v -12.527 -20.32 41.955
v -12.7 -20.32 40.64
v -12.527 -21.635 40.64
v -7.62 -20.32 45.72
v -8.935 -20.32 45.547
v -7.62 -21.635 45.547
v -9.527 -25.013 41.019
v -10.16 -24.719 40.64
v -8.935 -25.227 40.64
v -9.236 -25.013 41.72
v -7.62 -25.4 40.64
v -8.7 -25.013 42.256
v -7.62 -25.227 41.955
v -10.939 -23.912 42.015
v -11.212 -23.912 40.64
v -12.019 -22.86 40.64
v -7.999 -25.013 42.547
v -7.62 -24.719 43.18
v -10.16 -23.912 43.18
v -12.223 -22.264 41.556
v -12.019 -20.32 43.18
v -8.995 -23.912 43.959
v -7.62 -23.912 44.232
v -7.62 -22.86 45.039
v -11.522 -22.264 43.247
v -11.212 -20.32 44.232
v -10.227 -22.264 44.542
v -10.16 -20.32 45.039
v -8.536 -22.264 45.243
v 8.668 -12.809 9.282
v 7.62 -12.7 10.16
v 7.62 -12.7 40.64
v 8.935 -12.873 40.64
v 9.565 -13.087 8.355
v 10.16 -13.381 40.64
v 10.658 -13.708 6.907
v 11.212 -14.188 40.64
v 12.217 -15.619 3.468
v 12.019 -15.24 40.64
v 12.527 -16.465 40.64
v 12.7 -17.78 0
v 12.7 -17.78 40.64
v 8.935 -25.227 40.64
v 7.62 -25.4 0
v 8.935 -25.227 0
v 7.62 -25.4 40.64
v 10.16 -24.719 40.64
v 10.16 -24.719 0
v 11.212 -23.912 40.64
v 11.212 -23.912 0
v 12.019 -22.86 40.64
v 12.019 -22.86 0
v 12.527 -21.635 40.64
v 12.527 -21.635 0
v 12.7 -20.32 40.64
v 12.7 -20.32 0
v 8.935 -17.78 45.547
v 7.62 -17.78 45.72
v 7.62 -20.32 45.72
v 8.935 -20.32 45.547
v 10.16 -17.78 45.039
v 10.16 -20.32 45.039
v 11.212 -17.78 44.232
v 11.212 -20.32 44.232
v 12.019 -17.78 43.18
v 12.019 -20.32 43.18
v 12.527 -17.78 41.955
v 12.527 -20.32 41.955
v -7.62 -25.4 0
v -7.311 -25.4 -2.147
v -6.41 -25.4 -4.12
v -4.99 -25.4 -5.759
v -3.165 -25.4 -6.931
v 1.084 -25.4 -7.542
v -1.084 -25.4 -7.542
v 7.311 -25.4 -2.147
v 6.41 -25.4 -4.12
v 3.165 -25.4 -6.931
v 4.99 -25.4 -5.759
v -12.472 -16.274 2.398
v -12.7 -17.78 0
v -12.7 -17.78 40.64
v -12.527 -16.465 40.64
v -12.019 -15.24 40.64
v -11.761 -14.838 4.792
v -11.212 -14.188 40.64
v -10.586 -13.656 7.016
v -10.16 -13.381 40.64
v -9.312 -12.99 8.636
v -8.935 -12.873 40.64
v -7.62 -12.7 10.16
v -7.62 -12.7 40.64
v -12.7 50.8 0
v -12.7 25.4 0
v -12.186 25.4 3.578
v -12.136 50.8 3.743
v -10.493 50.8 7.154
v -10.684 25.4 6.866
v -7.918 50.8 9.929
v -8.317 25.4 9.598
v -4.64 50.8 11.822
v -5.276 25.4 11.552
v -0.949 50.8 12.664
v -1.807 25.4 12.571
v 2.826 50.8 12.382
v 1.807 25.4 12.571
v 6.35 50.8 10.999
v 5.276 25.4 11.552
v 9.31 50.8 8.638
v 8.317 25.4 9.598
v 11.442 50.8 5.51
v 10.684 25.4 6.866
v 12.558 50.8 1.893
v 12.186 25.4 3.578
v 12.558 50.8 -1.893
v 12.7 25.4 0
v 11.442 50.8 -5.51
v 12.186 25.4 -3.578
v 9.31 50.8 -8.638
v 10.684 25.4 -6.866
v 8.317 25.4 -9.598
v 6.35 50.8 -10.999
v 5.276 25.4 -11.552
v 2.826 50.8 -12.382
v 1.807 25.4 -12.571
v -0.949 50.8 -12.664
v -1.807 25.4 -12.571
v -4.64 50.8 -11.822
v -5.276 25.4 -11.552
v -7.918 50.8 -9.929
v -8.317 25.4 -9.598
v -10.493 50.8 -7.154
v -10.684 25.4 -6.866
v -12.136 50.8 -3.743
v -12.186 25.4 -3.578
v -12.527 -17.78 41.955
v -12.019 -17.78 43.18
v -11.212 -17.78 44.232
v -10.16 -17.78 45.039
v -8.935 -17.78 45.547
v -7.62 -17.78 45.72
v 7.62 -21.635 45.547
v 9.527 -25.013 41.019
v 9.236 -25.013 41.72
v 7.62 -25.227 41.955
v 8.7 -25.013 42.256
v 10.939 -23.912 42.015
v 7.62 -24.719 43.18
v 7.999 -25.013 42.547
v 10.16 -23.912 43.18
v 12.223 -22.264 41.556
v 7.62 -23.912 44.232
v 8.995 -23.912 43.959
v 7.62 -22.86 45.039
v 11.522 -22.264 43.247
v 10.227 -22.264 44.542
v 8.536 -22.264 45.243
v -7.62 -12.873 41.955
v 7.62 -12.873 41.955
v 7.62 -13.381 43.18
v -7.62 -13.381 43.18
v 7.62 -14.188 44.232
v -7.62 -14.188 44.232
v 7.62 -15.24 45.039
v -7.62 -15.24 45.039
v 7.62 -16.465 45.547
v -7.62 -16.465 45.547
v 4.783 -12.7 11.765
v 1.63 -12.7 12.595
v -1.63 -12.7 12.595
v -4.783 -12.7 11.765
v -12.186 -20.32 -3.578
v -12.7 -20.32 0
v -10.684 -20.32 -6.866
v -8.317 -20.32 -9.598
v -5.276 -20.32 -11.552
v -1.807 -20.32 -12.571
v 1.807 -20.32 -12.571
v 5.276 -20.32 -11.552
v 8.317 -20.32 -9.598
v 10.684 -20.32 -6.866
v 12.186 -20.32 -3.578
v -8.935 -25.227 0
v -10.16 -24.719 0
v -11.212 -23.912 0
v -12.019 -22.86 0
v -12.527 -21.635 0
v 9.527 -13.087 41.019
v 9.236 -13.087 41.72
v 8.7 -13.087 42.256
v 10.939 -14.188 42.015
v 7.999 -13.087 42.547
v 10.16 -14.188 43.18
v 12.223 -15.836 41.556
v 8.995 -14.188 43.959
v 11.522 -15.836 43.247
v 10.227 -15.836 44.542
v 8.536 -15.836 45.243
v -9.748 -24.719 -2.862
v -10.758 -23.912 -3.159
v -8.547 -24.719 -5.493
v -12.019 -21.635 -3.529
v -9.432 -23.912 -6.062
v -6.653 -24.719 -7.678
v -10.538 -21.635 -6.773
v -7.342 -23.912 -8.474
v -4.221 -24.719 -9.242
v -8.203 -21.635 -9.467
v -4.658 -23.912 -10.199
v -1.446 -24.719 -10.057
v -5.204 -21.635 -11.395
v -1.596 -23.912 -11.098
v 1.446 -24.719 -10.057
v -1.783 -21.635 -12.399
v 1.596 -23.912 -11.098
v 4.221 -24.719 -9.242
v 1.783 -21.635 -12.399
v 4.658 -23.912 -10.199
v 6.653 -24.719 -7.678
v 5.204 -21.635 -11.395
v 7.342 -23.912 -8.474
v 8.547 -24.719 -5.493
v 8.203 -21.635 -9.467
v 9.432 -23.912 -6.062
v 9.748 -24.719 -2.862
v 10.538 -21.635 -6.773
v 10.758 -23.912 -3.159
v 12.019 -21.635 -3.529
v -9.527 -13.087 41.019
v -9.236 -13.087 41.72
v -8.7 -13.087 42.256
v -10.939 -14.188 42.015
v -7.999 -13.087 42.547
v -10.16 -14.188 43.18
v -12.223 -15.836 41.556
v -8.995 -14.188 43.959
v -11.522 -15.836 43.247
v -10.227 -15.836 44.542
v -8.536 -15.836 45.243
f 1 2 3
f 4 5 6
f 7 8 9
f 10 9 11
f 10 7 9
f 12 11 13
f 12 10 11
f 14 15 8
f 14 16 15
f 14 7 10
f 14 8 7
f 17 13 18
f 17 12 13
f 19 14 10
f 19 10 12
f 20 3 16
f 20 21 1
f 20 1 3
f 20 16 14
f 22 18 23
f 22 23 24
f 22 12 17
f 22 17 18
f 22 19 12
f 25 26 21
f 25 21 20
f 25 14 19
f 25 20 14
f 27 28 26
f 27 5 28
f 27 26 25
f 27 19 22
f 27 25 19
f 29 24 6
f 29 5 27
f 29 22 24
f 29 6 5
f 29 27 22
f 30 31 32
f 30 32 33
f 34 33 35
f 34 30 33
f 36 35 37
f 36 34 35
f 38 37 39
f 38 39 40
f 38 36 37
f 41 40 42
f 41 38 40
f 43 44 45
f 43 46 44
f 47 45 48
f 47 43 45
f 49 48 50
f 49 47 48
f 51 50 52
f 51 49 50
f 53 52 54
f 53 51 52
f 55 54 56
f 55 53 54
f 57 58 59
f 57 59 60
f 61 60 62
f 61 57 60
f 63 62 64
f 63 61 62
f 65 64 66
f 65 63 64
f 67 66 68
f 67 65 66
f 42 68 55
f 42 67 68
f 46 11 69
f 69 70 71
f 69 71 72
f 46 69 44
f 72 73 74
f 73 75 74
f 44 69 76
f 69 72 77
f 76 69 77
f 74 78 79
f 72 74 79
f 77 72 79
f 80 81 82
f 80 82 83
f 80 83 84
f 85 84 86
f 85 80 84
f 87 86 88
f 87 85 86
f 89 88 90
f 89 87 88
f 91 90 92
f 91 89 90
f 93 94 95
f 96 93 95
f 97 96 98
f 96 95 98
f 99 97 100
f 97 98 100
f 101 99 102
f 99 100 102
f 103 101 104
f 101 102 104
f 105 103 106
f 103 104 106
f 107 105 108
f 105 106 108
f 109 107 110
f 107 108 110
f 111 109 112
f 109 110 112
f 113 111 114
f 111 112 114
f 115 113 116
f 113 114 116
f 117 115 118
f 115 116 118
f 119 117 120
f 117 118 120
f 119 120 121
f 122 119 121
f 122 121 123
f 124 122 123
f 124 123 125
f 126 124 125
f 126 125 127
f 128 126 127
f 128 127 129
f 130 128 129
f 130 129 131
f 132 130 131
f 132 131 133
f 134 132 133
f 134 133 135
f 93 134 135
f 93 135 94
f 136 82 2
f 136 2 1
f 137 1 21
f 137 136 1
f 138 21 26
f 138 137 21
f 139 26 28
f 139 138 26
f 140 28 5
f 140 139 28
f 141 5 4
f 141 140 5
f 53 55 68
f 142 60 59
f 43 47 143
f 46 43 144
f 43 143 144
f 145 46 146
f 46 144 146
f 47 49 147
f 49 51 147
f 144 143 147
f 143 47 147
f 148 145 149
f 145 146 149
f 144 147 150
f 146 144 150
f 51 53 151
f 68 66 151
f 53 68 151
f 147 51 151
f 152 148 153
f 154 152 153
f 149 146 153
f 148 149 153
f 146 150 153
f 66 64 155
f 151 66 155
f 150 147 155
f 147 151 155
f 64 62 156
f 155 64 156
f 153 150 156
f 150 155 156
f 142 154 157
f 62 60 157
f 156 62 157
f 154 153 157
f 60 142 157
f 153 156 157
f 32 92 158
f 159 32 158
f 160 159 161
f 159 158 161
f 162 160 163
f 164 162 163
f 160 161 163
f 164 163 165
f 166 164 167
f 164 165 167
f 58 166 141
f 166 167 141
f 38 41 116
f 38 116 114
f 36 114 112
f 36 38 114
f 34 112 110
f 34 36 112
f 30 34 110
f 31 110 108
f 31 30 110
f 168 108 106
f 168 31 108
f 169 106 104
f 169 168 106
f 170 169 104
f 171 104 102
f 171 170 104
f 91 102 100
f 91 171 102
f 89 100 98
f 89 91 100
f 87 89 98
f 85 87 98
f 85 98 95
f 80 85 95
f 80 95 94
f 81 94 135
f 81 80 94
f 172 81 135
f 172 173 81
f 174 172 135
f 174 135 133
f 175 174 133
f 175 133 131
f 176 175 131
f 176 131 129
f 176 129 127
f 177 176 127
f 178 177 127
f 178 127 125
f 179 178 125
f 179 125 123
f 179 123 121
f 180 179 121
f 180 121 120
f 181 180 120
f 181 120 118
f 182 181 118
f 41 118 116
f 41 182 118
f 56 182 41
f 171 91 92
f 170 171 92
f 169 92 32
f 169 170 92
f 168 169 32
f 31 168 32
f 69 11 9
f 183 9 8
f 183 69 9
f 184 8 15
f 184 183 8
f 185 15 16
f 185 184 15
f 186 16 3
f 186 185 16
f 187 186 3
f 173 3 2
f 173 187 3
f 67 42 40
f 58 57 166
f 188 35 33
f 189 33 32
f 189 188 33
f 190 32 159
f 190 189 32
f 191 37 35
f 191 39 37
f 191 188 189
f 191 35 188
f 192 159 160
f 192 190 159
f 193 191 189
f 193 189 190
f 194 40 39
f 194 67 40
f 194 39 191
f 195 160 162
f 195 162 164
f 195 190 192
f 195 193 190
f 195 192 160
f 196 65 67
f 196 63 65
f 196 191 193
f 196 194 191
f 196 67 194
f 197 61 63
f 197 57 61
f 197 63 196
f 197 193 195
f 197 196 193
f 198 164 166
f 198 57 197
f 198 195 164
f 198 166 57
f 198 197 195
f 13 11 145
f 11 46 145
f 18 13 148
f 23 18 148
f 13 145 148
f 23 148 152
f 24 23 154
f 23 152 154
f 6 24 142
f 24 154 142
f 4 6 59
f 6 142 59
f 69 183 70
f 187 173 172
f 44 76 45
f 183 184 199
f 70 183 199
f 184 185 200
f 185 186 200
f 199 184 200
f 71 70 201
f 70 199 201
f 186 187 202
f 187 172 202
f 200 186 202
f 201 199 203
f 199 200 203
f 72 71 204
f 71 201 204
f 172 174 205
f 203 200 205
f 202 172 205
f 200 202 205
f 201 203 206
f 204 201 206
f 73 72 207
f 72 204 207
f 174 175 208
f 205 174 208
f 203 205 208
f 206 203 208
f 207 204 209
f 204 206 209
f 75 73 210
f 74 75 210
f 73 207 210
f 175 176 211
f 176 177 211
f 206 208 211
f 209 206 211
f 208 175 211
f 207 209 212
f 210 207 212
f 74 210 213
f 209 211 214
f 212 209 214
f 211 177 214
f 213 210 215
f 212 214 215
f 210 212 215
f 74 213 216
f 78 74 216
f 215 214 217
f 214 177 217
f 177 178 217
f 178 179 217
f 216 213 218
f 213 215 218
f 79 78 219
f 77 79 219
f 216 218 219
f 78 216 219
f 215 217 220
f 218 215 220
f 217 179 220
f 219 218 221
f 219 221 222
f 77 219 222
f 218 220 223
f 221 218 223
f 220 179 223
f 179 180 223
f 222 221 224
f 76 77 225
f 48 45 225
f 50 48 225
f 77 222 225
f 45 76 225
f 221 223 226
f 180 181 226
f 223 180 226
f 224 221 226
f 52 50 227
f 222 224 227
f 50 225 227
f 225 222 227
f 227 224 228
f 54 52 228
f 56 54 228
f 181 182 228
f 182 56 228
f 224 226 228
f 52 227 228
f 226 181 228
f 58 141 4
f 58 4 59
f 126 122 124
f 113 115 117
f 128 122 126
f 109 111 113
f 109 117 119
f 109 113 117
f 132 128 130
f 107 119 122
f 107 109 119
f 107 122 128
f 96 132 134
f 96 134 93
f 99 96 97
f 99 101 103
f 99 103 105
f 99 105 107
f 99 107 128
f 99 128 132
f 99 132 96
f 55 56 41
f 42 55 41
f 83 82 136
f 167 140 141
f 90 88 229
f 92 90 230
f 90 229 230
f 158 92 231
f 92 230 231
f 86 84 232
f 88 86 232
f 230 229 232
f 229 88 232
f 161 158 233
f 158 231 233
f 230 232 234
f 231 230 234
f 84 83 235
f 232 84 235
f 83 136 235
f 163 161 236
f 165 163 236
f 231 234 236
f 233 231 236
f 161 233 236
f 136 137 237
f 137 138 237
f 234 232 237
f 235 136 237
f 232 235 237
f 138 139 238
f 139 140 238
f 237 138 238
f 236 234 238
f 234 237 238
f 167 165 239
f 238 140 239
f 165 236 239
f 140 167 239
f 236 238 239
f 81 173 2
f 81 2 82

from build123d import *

# Parameters (mm, degrees)
F0_R         = 12.7
F1_DEPTH     = 25.4
F2_W         = 25.4
F2_H         = 12.7
F3_DEPTH     = 45.72
F4_R         = 5.08
F5_T1_DEPTH  = 15.24
F5_T6_DEPTH  = 53.34
F5_S7_R      = 12.7
F5_T8_DEPTH  = 28
F5_T10_ANGLE = 90
F5_T14_DEPTH = 53.34
F5_S15_R     = 12.7
F5_T16_DEPTH = 28
F5_T18_ANGLE = 90
F6_R         = 12.7
F7_DEPTH     = 25.4


# Not quite as in the source:
# - a fillet or chamfer that OpenCascade refuses, or shapes differently, is made with other operations: its cross-section is extruded or revolved along the edge and cut away or added


with BuildPart() as f1:
    # F0 (on Front) → F1 (new body, symmetric)
    with BuildSketch(Plane.XZ):
        Circle(F0_R)
    extrude(amount=F1_DEPTH, both=True)

    # F2 (on Top) → F3 (join)
    with BuildSketch(Plane.XY):
        with Locations((0, -19.05)):
            Rectangle(F2_W, F2_H)
    extrude(amount=F3_DEPTH)

    # F4
    f4_edges = [f1.edges().sort_by_distance(p)[0] for p in [
        (-12.7, -19.05, 45.72),
        (12.7, -19.05, 45.72),
        (0, -25.4, -12.7),
        (0, -25.4, 45.72),
    ]]
    fillet(f4_edges, radius=F4_R)

    # F5: fillet of radius 5.08 on 5 edges, made by hand

    # F5_s2 → F5_t1 (cut)
    with BuildSketch(Plane.YZ.offset(-7.62)):
        with BuildLine():
            ThreePointArc((-12.7, 40.64), (-14.1878975516, 44.2321024484), (-17.78, 45.72))
            Line((-17.78, 45.72), (-12.7, 45.72))
            Line((-12.7, 45.72), (-12.7, 40.64))
        make_face()
    extrude(amount=F5_T1_DEPTH, mode=Mode.SUBTRACT)


with BuildPart() as f5_tool4:
    # F5_s5 → F5_t6 (new body)
    with BuildSketch(Plane.XY.offset(-12.7)):
        with BuildLine():
            ThreePointArc((-12.7, -17.78), (-11.2121024484, -14.1878975516), (-7.62, -12.7))
            Line((-7.62, -12.7), (-12.7, -12.7))
            Line((-12.7, -12.7), (-12.7, -17.78))
        make_face()
    extrude(amount=F5_T6_DEPTH)

    # F5_s7 → F5_t8 (cut, symmetric)
    with BuildSketch(Plane.XZ.offset(15.2)):
        Circle(F5_S7_R)
    extrude(amount=F5_T8_DEPTH, both=True, mode=Mode.SUBTRACT)


with BuildPart() as f1_1:
    add(f1.part)

    # F5_t3: cut F5_tool4
    add(f5_tool4.part, mode=Mode.SUBTRACT)

    # F5_s9 → F5_t10 (revolve, cut)
    with BuildSketch(Plane.XY.offset(40.64)):
        with BuildLine():
            ThreePointArc((-7.62, -12.7), (-11.2121024484, -14.1878975516), (-12.7, -17.78))
            Line((-12.7, -17.78), (-12.7, -12.7))
            Line((-12.7, -12.7), (-7.62, -12.7))
        make_face()
    revolve(axis=Axis((-7.62, -12.7, 40.64), (0, 1, 0)), revolution_arc=F5_T10_ANGLE, mode=Mode.SUBTRACT)


with BuildPart() as f5_tool12:
    # F5_s13 → F5_t14 (new body)
    with BuildSketch(Plane.XY.offset(-12.7)):
        with BuildLine():
            ThreePointArc((7.62, -12.7), (11.2121024484, -14.1878975516), (12.7, -17.78))
            Line((12.7, -17.78), (12.7, -12.7))
            Line((12.7, -12.7), (7.62, -12.7))
        make_face()
    extrude(amount=F5_T14_DEPTH)

    # F5_s15 → F5_t16 (cut, symmetric)
    with BuildSketch(Plane.XZ.offset(15.2)):
        Circle(F5_S15_R)
    extrude(amount=F5_T16_DEPTH, both=True, mode=Mode.SUBTRACT)


with BuildPart() as f1_2:
    add(f1_1.part)

    # F5_t11: cut F5_tool12
    add(f5_tool12.part, mode=Mode.SUBTRACT)

    # F5_s17 → F5_t18 (revolve, cut)
    with BuildSketch(Plane.XY.offset(40.64)):
        with BuildLine():
            ThreePointArc((7.62, -12.7), (11.2121024484, -14.1878975516), (12.7, -17.78))
            Line((12.7, -17.78), (12.7, -12.7))
            Line((12.7, -12.7), (7.62, -12.7))
        make_face()
    revolve(axis=Axis((7.62, -12.7, 40.64), (0, -1, 0)), revolution_arc=F5_T18_ANGLE, mode=Mode.SUBTRACT)

    # F6 (on face) → F7 (join)
    with BuildSketch(Plane(origin=(0, 25.4, 0), x_dir=(-1, 0, 0), z_dir=(0, 1, 0))):
        Circle(F6_R)
    extrude(amount=F7_DEPTH)


solid = f1_2.part
